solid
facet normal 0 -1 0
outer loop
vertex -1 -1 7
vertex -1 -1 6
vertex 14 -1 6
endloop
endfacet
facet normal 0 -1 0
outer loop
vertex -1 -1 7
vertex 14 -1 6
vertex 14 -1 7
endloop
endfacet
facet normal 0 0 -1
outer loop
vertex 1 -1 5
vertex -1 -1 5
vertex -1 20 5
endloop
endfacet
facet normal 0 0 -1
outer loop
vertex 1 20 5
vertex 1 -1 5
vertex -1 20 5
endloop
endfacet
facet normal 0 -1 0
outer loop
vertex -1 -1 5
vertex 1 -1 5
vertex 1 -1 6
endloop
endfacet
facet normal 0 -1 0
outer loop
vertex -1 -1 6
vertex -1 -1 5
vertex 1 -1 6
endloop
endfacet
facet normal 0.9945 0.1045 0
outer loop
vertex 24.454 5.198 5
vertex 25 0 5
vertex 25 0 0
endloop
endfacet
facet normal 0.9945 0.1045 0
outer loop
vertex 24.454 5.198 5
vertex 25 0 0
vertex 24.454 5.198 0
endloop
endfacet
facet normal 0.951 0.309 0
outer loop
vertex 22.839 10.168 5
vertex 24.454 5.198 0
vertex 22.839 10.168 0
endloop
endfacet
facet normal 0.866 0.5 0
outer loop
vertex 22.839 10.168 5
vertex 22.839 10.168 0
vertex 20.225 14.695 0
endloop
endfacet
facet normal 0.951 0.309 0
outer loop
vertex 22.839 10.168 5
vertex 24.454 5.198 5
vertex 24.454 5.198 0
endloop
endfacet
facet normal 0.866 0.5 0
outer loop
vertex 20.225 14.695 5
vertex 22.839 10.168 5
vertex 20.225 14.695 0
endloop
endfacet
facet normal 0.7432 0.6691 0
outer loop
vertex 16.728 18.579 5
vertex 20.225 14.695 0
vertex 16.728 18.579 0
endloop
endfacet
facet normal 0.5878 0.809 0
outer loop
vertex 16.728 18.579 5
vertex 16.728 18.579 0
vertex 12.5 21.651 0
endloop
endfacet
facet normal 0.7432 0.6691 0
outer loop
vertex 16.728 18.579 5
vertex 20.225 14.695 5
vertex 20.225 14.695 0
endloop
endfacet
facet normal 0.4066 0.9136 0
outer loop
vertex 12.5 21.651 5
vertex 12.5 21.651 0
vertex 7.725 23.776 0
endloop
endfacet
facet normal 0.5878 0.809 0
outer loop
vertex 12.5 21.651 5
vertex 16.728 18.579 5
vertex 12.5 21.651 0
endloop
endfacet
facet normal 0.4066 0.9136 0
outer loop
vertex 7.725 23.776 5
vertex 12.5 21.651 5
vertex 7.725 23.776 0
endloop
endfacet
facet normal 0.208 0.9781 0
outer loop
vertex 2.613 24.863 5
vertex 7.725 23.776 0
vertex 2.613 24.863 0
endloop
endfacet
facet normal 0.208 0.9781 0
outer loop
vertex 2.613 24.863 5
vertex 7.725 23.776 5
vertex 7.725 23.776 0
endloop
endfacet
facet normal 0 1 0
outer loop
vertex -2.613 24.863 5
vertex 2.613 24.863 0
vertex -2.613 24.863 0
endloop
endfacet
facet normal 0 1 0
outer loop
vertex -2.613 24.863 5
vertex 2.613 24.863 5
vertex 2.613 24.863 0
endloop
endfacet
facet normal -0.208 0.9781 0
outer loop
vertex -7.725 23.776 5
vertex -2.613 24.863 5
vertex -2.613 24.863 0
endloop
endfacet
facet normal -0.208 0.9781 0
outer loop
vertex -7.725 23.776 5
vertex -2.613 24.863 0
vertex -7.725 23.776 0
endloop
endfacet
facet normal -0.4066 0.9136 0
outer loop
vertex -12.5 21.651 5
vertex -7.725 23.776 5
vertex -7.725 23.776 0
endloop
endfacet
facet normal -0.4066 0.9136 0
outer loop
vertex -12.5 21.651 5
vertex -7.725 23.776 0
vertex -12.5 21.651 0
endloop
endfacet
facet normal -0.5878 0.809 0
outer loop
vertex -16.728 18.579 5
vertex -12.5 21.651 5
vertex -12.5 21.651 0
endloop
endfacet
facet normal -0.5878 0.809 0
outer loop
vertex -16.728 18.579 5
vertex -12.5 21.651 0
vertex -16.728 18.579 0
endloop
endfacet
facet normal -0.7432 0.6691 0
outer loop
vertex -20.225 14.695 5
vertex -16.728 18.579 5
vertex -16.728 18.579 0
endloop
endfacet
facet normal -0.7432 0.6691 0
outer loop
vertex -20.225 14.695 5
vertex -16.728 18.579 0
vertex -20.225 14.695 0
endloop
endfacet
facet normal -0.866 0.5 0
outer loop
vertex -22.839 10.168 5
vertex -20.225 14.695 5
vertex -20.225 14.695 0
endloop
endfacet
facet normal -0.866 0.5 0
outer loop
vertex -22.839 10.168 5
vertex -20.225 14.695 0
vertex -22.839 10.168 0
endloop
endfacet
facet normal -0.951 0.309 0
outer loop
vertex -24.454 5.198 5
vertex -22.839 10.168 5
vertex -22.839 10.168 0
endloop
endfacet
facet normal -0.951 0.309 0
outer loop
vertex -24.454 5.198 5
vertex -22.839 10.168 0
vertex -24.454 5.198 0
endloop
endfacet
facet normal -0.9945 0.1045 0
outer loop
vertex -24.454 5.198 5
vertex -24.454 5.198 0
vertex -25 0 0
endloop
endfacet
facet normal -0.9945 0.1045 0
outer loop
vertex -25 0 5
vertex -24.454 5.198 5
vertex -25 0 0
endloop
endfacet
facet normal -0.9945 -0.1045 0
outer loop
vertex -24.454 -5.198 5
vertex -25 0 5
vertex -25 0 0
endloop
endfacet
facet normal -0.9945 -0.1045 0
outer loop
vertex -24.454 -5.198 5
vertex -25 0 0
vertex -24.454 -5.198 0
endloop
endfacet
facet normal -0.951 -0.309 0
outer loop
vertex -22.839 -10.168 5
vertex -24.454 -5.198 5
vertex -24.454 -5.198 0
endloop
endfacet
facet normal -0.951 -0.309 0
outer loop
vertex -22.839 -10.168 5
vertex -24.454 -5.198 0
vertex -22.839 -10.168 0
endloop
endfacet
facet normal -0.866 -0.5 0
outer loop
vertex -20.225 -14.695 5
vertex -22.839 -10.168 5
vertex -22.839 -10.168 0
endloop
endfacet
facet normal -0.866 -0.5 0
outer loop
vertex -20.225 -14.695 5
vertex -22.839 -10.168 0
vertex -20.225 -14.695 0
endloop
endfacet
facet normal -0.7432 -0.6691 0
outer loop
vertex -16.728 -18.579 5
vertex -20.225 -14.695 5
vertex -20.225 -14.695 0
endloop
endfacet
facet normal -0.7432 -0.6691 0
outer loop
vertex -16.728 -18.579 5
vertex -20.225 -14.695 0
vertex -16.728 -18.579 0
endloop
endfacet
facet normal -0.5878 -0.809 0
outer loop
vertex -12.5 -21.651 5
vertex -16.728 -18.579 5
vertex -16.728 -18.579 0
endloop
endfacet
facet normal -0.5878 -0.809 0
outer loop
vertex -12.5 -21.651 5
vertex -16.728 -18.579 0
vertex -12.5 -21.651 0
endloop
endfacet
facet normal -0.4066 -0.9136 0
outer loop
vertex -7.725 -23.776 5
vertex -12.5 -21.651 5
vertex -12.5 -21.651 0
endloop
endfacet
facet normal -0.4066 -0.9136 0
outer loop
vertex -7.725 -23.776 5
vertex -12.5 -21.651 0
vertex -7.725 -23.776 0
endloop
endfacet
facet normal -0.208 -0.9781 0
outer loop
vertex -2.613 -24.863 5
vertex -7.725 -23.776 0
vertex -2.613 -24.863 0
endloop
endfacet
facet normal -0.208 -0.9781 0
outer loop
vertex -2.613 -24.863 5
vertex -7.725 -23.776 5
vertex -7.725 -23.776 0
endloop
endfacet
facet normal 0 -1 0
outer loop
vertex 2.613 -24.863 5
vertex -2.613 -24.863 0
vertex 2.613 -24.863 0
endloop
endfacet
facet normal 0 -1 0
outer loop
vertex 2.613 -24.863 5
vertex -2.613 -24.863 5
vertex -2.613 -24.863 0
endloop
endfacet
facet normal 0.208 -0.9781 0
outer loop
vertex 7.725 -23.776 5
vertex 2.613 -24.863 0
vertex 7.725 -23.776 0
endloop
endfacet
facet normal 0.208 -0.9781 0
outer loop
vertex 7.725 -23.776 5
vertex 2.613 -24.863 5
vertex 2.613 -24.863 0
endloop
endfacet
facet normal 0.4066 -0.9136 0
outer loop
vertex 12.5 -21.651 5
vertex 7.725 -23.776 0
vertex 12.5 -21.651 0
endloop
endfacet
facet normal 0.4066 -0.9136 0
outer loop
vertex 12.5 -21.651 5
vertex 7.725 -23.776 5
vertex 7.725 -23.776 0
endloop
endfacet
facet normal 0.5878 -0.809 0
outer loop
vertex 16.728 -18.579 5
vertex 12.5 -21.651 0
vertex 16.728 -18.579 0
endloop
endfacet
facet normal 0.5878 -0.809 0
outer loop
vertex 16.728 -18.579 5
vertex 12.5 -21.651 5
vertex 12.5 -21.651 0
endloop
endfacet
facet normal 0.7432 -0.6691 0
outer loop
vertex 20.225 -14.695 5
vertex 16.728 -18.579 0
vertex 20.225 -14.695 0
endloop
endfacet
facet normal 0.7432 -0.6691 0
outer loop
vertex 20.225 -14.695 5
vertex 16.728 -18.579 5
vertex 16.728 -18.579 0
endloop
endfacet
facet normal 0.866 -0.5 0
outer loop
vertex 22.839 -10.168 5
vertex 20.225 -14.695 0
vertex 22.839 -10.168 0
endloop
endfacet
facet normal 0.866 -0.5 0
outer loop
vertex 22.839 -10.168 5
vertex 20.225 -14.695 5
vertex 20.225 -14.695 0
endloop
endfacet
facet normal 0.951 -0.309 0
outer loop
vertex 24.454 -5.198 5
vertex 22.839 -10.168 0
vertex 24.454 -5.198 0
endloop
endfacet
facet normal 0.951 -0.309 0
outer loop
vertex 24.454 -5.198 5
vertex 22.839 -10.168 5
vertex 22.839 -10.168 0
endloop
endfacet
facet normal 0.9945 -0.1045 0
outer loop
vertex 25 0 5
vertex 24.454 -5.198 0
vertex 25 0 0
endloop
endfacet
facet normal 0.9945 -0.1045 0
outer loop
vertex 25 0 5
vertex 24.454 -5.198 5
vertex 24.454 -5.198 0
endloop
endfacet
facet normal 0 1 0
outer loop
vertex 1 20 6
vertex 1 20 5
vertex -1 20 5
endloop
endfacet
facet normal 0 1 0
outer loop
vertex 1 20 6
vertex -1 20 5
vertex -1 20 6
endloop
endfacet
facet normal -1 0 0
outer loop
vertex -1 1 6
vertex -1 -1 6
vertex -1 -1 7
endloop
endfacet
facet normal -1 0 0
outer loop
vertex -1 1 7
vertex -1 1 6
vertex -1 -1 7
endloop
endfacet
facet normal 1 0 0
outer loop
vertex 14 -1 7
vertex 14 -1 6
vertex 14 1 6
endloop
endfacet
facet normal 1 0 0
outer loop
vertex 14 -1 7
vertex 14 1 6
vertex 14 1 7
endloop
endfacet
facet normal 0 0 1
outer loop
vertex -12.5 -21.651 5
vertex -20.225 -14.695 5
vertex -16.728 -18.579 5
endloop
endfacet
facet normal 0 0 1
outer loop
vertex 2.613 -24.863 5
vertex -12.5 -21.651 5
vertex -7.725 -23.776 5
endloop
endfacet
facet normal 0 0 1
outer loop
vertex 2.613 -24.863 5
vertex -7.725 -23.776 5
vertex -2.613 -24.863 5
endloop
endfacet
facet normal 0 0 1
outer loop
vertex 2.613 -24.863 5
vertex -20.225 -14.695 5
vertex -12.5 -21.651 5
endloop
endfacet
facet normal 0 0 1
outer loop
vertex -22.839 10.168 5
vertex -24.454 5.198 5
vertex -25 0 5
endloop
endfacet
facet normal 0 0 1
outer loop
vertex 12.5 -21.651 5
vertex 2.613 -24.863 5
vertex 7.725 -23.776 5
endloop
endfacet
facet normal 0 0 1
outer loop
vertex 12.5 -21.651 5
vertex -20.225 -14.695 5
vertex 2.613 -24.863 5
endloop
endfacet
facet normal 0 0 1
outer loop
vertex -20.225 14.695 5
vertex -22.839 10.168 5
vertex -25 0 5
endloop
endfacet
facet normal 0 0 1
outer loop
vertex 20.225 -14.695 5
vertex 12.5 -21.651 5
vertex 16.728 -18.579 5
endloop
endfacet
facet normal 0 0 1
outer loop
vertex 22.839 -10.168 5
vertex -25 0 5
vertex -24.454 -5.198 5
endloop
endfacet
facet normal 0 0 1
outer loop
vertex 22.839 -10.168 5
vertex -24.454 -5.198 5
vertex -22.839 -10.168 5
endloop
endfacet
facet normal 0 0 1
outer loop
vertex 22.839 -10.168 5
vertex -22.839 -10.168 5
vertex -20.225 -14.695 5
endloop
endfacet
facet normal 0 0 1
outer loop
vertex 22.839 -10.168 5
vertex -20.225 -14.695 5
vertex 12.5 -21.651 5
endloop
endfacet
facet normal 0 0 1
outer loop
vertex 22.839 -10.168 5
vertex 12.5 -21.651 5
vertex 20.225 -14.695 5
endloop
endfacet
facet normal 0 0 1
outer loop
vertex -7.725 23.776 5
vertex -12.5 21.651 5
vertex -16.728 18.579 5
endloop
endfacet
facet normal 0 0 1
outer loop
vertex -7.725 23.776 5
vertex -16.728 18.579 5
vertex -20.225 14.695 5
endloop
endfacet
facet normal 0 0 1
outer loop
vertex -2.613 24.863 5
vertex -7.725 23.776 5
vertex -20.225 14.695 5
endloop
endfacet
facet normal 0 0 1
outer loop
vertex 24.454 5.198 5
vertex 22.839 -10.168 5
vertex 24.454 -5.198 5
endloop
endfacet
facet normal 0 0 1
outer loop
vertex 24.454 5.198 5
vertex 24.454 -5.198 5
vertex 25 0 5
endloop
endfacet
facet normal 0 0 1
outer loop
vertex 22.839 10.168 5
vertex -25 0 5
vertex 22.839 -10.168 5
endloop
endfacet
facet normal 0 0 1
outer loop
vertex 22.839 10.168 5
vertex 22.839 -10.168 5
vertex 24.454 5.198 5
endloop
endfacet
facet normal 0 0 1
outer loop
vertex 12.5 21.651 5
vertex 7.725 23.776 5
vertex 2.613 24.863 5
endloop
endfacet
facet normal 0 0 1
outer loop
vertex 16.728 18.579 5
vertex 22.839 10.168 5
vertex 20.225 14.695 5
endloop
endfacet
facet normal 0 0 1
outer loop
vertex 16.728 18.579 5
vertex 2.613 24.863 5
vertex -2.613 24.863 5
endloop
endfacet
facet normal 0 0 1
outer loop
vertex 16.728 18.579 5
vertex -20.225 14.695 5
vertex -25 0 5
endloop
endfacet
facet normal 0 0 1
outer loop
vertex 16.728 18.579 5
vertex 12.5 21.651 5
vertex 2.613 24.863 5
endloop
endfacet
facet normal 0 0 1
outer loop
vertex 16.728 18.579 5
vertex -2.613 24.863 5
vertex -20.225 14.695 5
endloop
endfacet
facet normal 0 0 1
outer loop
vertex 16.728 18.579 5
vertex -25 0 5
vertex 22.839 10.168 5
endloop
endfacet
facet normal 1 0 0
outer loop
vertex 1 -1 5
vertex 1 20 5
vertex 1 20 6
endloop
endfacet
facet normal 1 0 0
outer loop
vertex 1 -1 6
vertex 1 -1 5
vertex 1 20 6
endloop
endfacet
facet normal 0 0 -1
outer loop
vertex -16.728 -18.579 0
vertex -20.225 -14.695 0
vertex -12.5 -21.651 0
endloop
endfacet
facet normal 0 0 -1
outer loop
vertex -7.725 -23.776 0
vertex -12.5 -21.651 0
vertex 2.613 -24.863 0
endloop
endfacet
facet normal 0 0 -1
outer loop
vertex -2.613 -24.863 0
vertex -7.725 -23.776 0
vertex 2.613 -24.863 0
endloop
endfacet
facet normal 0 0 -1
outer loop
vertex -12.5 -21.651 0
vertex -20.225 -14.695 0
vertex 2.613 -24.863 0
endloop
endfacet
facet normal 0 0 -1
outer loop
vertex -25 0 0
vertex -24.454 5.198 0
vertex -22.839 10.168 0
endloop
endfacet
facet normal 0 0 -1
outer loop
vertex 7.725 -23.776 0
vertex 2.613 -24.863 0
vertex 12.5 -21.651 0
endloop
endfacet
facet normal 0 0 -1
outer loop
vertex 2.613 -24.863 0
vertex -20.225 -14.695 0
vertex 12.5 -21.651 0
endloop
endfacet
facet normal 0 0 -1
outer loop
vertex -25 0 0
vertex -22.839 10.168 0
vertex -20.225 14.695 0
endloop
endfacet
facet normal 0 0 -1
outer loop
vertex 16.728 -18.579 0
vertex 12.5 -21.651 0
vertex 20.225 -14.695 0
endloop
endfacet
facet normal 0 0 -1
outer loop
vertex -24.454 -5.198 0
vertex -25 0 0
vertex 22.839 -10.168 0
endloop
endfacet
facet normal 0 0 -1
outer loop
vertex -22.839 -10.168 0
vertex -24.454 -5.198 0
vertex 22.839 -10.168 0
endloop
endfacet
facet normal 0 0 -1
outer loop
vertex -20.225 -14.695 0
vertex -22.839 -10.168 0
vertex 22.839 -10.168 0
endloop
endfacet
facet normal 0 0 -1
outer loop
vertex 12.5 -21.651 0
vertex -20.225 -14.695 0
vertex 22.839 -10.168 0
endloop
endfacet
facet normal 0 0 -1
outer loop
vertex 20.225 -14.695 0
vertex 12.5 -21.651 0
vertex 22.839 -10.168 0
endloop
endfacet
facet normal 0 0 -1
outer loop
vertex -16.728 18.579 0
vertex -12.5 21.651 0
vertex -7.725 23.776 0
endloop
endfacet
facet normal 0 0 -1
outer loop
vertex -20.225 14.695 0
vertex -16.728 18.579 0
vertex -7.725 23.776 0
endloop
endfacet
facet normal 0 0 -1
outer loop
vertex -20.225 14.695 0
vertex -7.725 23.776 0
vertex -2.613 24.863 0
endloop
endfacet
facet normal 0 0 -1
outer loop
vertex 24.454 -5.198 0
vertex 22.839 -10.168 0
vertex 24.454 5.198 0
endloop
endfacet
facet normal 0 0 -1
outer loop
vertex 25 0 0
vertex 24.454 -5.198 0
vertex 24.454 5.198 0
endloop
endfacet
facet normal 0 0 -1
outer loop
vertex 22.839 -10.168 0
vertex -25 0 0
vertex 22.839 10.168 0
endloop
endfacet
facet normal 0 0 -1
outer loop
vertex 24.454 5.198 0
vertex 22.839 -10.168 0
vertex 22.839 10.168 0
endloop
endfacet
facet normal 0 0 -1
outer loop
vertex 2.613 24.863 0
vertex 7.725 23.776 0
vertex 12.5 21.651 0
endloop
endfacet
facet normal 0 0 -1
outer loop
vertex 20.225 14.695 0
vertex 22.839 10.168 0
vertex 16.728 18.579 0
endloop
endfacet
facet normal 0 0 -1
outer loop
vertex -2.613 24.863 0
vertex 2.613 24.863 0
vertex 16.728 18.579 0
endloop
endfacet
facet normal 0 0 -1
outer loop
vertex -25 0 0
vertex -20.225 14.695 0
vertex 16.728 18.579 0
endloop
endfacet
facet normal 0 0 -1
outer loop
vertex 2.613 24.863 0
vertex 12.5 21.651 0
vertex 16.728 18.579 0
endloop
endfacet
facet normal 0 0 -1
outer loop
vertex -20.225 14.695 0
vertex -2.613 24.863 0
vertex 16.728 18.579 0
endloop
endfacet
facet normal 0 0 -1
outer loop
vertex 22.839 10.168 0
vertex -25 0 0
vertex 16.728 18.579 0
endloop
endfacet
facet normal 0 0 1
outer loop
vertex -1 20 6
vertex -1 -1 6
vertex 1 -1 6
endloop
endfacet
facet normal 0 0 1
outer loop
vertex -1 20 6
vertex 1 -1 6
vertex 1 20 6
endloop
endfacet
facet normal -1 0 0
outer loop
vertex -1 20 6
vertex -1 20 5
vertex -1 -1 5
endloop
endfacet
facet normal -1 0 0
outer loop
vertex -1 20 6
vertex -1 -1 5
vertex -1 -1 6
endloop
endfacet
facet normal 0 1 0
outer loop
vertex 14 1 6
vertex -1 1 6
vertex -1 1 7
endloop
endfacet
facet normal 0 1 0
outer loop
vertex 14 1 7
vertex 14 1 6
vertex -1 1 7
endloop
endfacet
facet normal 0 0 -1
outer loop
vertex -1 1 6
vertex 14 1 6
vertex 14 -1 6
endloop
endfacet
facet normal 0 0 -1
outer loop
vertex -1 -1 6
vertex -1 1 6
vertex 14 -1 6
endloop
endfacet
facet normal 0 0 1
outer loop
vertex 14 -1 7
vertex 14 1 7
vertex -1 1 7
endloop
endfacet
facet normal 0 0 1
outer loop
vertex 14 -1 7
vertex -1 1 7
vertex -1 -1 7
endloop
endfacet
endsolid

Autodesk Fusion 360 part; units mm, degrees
cylinder "CylinderPrimitive1" add diameter 50 height 5 placed x (1, 0, 0) y (0, 1, 0) z (0, 0, 1) at (0, 0, 0) makes body 1
box "BoxPrimitive1" add length 21 width 2 height 1 placed x (0, 1, 0) y (-1, 0, 0) z (0, 0, 1) at (1, -1, 5) separate body makes body 2
box "BoxPrimitive1'" add length 2 width 15 height 1 placed x (0, -1, 0) y (1, 0, 0) z (0, 0, 1) at (-1, 1, 6) separate body makes body 3 in component "Hour_Hand"
copy_body "Body->Comp1" bodies 2 removing the originals makes body 4 in component "Minutes_Hand"
component "Hour_Hand" placed x (1, 0, 0) y (0, 1, 0) z (0, 0, 1) at (0, 0, 0)
component "Minutes_Hand" placed x (1, 0, 0) y (0, 1, 0) z (0, 0, 1) at (0, 0, 0)
